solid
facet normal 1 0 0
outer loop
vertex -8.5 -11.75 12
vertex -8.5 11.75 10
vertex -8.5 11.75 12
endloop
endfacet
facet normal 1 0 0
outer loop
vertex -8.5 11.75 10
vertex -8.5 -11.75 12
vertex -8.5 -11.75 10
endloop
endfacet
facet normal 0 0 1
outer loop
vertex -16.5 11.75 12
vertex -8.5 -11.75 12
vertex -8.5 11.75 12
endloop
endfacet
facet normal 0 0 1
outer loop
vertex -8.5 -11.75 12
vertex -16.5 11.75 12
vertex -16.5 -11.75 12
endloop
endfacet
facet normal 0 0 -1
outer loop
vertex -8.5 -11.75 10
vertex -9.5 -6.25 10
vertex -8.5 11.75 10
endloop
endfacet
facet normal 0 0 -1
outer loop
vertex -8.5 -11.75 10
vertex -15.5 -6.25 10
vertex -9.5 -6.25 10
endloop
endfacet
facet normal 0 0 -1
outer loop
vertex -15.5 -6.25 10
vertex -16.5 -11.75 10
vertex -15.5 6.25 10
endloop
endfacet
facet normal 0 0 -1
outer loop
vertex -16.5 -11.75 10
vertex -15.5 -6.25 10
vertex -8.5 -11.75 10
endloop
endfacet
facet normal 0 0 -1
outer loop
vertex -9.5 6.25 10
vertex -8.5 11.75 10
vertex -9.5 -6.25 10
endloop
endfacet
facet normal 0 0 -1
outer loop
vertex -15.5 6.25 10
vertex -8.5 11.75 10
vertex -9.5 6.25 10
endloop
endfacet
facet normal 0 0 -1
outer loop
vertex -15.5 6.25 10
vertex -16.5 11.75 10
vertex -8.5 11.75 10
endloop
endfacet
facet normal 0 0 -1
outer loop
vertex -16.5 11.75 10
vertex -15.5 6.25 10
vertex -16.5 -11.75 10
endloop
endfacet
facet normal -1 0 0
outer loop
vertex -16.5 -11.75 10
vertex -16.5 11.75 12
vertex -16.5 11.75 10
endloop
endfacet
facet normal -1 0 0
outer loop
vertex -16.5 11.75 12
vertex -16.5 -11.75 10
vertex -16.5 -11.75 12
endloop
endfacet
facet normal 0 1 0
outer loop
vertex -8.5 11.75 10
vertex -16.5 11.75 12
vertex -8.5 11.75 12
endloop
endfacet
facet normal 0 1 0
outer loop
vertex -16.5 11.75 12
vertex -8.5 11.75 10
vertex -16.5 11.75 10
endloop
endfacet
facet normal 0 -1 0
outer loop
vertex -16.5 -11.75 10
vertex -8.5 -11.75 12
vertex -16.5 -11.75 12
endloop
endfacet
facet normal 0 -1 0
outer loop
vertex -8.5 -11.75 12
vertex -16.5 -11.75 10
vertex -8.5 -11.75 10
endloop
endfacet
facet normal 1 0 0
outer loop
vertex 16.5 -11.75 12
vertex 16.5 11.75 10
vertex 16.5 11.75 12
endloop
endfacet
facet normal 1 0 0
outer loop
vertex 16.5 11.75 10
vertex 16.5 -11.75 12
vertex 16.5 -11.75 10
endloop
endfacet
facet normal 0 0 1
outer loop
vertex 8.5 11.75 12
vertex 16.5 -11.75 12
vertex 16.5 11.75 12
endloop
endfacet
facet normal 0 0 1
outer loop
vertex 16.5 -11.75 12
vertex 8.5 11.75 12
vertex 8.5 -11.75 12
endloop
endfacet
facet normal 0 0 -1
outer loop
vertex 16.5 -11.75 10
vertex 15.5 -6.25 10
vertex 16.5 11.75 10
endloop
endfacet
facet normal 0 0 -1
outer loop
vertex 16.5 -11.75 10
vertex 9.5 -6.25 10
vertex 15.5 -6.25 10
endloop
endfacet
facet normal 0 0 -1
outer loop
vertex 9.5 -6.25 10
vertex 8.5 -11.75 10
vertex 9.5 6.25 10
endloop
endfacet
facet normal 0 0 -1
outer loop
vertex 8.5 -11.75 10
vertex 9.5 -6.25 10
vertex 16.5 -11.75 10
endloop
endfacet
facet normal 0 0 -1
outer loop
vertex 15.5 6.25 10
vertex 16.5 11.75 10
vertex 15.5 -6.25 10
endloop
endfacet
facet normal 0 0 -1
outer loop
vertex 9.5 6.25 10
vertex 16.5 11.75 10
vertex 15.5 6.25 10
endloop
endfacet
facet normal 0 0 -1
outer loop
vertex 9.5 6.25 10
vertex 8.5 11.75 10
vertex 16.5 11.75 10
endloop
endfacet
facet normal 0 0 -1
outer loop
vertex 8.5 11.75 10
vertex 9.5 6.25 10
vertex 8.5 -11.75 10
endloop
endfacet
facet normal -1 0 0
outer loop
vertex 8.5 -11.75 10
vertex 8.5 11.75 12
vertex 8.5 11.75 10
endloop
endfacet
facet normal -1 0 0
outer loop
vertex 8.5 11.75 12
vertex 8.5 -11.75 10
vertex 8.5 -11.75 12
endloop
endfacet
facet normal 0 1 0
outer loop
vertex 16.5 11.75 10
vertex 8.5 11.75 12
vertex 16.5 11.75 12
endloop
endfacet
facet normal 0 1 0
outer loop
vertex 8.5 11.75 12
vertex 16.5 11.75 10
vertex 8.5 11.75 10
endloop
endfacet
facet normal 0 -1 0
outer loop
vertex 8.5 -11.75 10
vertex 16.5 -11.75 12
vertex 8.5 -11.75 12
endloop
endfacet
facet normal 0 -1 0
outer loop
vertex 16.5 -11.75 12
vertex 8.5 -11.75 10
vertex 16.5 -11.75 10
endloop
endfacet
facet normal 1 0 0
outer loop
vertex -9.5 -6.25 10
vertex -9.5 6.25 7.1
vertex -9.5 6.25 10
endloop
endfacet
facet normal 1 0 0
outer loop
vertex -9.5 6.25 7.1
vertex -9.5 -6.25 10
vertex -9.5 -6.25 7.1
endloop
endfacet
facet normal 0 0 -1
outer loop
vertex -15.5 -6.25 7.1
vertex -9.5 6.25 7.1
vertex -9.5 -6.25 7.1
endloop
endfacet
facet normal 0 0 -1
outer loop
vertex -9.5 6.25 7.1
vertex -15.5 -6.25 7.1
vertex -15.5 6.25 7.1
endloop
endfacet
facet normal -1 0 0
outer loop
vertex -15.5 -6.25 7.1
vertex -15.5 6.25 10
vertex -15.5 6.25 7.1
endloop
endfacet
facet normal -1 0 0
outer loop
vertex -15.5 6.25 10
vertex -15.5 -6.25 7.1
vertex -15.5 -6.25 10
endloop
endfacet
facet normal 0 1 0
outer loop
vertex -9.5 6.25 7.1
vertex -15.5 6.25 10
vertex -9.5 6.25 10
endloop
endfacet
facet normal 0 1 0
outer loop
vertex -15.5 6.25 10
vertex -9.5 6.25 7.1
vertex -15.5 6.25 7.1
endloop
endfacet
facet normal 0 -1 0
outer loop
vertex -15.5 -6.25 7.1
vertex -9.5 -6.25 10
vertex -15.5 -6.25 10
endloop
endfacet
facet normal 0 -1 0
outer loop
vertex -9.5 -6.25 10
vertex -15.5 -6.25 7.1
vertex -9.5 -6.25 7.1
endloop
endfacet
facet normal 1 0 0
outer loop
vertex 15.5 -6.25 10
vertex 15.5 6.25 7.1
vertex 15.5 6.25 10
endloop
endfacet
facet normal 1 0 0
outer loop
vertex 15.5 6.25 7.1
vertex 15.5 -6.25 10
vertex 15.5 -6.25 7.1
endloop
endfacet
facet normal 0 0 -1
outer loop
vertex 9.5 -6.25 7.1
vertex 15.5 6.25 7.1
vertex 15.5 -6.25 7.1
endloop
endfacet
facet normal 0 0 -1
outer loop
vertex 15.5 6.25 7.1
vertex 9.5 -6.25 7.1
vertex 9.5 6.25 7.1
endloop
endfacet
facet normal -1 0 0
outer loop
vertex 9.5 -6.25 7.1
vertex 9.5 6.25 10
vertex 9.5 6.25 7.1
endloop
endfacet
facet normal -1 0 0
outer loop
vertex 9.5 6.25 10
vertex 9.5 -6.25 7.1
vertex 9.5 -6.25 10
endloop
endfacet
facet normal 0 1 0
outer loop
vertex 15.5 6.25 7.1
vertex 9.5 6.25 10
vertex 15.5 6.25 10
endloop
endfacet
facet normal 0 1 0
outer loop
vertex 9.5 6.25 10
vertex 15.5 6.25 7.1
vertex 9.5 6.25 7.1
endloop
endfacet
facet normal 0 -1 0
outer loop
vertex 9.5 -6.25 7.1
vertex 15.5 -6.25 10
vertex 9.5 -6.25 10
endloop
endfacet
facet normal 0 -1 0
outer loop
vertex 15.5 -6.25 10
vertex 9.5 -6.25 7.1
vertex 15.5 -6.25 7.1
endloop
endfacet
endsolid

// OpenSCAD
// file: ../../board-pocket/board-pocket.scad
//-----------------------------------------------------------------------
// Board pocket: holds a board that has no mounting holes
//
// The board sits on a central pedestal with a pad of double-sided foam tape
// on top, inside a low wall that follows its outline. The pedestal keeps
// the board's edges off the floor, so lead stubs soldered through the edge
// holes have room underneath; gaps in the wall let the leads out. The wall
// only locates the board: the tape holds it down, and in a closed box a lid
// pad presses a pad of foam onto it (boardLidPad below).
//
// Modules, all in the same frame:
//   boardPocketGhost()   the board and its tape, for previews
//   boardPocketHolder()  the plastic: pedestal and outline wall, add to the floor
//   boardLidPad()        a block hanging from the lid that presses foam onto the board
//   boardLidPadGhost()   the foam under it, squashed, for previews
//
// Frame: origin on the floor top, under the centre of the board's outline.
// X along the board's length l, Y across its width w, Z up. Units: mm.
//
// Sides are listed [-X, +X, -Y, +Y], each one of
//   "gap"    wall with a gap in the middle for leads (gapW wide)
//   "solid"  whole wall: use it where the board takes a push (a plug)
//   "open"   no wall: the board's edge goes into a box wall (a USB port)
//
// Used by esp32-c3-supermini, esp32-s3-devkitc and rs485-max485.
//-----------------------------------------------------------------------

//-- From the controller project's receiver.scad / rack-end.scad (boardPocket), 2026-10-30
bpPedestal  = 2.5;     // floor to the tape: room for lead stubs under the board edges
bpTape      = 1.0;     // double-sided foam tape on the pedestal. CAL: how far it squashes
bpWall      = 1.2;     // outline wall thickness
bpRise      = 1.0;     // wall top above the PCB underside (the controller project's rack-end: 0.8 under the S3's module)
bpClearance = 0.4;     // per side, board outline to wall: PETG. 0.3 for PLA. Set by the fit piece
bpGapW      = 6;       // lead gap in a "gap" side
bpPadInset  = 4;       // default pedestal: the board less this all round

//-- Lid hold-down (the controller project's receiver / rack-end lid pads)
bpFoam      = 3.0;     // CAL: self-adhesive foam stuck under each lid pad
bpSqueeze   = 1.0;     // how far the lid squashes it: ~1/3 for soft foam, 0.3 for felt

//-- PCB underside above the floor top
function boardPocketZ(pedestal = bpPedestal, tape = bpTape) = pedestal + tape;
//-- default pedestal [l, w] for a board
function boardPocketPad(l, w, inset = bpPadInset) = [max(l - 2*inset, 4), max(w - 2*inset, 4)];
//-- Z of a lid pad's underside, pressing on a surface at surfaceZ (board top, or a part on it)
function boardLidPadZ(surfaceZ, foam = bpFoam, squeeze = bpSqueeze) =
  assert(squeeze > 0 && squeeze < foam, "foam would not touch the board")
  surfaceZ + foam - squeeze;

function bpSides4(s) = is_list(s) ? s : [s, s, s, s];

module boardPocketGhost(l, w, pcb = 1.6, pad, pedestal = bpPedestal, tape = bpTape)
{
  p = is_undef(pad) ? boardPocketPad(l, w) : pad;
  %color("White") translate([-p[0]/2, -p[1]/2, pedestal]) cube([p[0], p[1], tape]);
  %color("DarkGreen") translate([-l/2, -w/2, pedestal + tape]) cube([l, w, pcb]);
}

//-- pad: pedestal [l, w]; gapW a number or one per side
module boardPocketHolder(l, w, pad, sides = "gap", gapW = bpGapW, clearance = bpClearance,
                         pedestal = bpPedestal, tape = bpTape, wall = bpWall, rise = bpRise)
{
  p   = is_undef(pad) ? boardPocketPad(l, w) : pad;
  s   = bpSides4(sides);
  g   = bpSides4(gapW);
  ix  = l/2 + clearance;                 // inner half sizes
  iy  = w/2 + clearance;
  top = pedestal + tape + rise;
  assert(p[0] <= l && p[1] <= w, "pedestal bigger than the board");
  for (k = s) assert(k == "gap" || k == "solid" || k == "open", str("unknown side ", k));

  //-- pedestal, centred under the board
  translate([-p[0]/2, -p[1]/2, -0.01]) cube([p[0], p[1], pedestal + 0.01]);
  //-- outline wall
  difference()
  {
    translate([-ix - wall, -iy - wall, -0.01]) cube([2*(ix + wall), 2*(iy + wall), top + 0.01]);
    translate([-ix, -iy, -1]) cube([2*ix, 2*iy, top + 2]);
    for (i = [0 : 3])
    {
      //-- each side's cut, drawn for -X then turned into place
      ax = (i < 2) ? ix : iy;         // inner half size across the side
      al = (i < 2) ? iy : ix;         // half length along it
      rotate([0, 0, [0, 180, 90, 270][i]])   // -X, +X, -Y, +Y
      {
        if (s[i] == "gap")
          translate([-ax - wall - 1, -g[i]/2, -1]) cube([wall + 2, g[i], top + 2]);
        if (s[i] == "open")
          translate([-ax - wall - 1, -al - wall - 1, -1]) cube([wall + 1.01, 2*(al + wall + 1), top + 2]);
      }
    }
  }
}

//-- A lid pad over the rectangle size [x, y] centred at `at`, from the squashed foam up to
//-- lidZ (the lid's inner face in this frame), running `into` up into the lid plate
module boardLidPad(size, at = [0, 0], surfaceZ, lidZ, foam = bpFoam, squeeze = bpSqueeze, into = 0.5)
{
  z0 = boardLidPadZ(surfaceZ, foam, squeeze);
  assert(lidZ > z0, "lid is below the pad: the box is too low for the foam");
  translate([at[0] - size[0]/2, at[1] - size[1]/2, z0]) cube([size[0], size[1], lidZ - z0 + into]);
}

module boardLidPadGhost(size, at = [0, 0], surfaceZ, foam = bpFoam, squeeze = bpSqueeze)
{
  %color("Gray") translate([at[0] - size[0]/2, at[1] - size[1]/2, surfaceZ]) cube([size[0], size[1], foam - squeeze]);
}
// file: ../rs485-max485.scad
//-----------------------------------------------------------------------
// TTL-to-RS485 module (MAX485 and friends), on the floor
//
// These modules have no mounting holes. The board sits on a taped pedestal
// inside an outline pocket (board-pocket), with lead gaps at both ends (bus
// end and logic end) and in the long sides. In a closed box two lid pads
// press foam onto it, one inboard of each end's pin row.
//
// Modules, all in the same frame:
//   rs485Ghost()     the board, its chips, pin holes and any screw terminal
//   rs485Holder()    the plastic: pedestal and outline pocket, add to the floor
//   rs485LidPads()   blocks under the lid that press foam onto the board
//
// Frame: origin on the floor top under the centre of the board. X along the
// board, bus end (A/B) at -X, logic end (VCC/TXD/RXD/GND) at +X. Z up. Units: mm.
//
// Sizes: pick a row of rs485Variants by name.
//-----------------------------------------------------------------------

//-- included, not used, so its default values (bpTape, bpClearance...) are in scope here
include <../board-pocket/board-pocket.scad>

//-- [name, length, width, pcb, tallest SMD, bus pins, logic pins, screw terminal [l, w, h] or undef]
rs485Variants = [
  //-- JZK 5-pack B09VGJCJKQ, auto-direction (MAX485 + CD4069). Outline measured 2026-10-21;
  //-- PCB CAL (probably 1.6). Bus end: A+ B- earth, bare holes. Logic: VCC TXD RXD GND
  ["jzk",    43.0, 15.5,  1.6, 2.0, 3, 4, undef],
  //-- XY-017 auto-direction (WINGONEER manual, manuals.plus/asin/B06XHH6B6R): 42.8 x 15.22 x 0.8.
  //-- Looks like the same family as the JZK; pin counts CAL
  ["xy-017", 42.8, 15.22, 0.8, 2.0, 3, 4, undef],
  //-- Classic blue MAX485 module (HW-0519 style): 44 x 14 on most listings (some 45 x 15, 46 x 12),
  //-- 4-pin header each end (RO RE DE DI / VCC B A GND), 2-way 5.08 screw terminal at the bus end.
  //-- PCB, terminal size and its place on the board CAL
  ["max485", 44.0, 14.0,  1.6, 2.0, 4, 4, [7.5, 10.2, 10.0]],
];
rs485Variant  = "jzk";

rs485PinPitch = 2.54;
rs485PinEnd   = 1.5;      // CAL: pin row centre from the board's end
rs485ChipSize = [5.0, 6.0, 1.75];   // SOIC-8, ghost only; placed either side of the middle (CAL)
//-- Holder (the controller project's receiver.scad / rack-end.scad)
rs485PadEnd   = 8.5;      // pedestal stops this far from each end: clear of the pin stubs
rs485PadSide  = 3.25;     // and this far from each long side (26 x 9 on the JZK)
rs485EndGap   = 10;       // lead gap at the ends: the 4-pin row is 7.62 across, plus wire
rs485SideGap  = 6;
rs485PadInset = 6;        // lid pads: this far inboard of each end
rs485PadLen   = 6;

function rs485(name = rs485Variant) = let (i = search([name], rs485Variants)[0])
  assert(i != [] && i != undef, str("unknown RS485 variant ", name)) rs485Variants[i];
function rs485Pad(variant = rs485Variant) = let (v = rs485(variant))
  [v[1] - 2*rs485PadEnd, v[2] - 2*rs485PadSide];
//-- PCB top above the floor
function rs485Top(variant = rs485Variant, pedestal = bpPedestal, tape = bpTape) =
  boardPocketZ(pedestal, tape) + rs485(variant)[3];

module rs485Ghost(variant = rs485Variant, pedestal = bpPedestal, tape = bpTape)
{
  v   = rs485(variant);
  top = rs485Top(variant, pedestal, tape);
  boardPocketGhost(v[1], v[2], v[3], rs485Pad(variant), pedestal, tape);
  for (x = [-1, 1])
    %color("Black") translate([x*5 - rs485ChipSize[0]/2, -rs485ChipSize[1]/2, top]) cube(rs485ChipSize);
  //-- pin rows across each end
  for (e = [[-1, v[5]], [1, v[6]]], i = [0 : e[1] - 1])
    %color("Gold") translate([e[0]*(v[1]/2 - rs485PinEnd), (i - (e[1] - 1)/2)*rs485PinPitch, top - v[3] - 0.01])
      cylinder(d = 1.0, h = v[3] + 0.02, $fn = 12);
  if (!is_undef(v[7]))
    %color("RoyalBlue") translate([-v[1]/2 + 3, -v[7][1]/2, top]) cube(v[7]);
}

module rs485Holder(variant = rs485Variant, sides = "gap", clearance = bpClearance,
                   pedestal = bpPedestal, tape = bpTape, rise = bpRise)
{
  v = rs485(variant);
  boardPocketHolder(v[1], v[2], rs485Pad(variant), sides,
                    [rs485EndGap, rs485EndGap, rs485SideGap, rs485SideGap],
                    clearance, pedestal, tape, bpWall, rise);
}

//-- lidZ: the lid's inner face above the floor top. With a screw terminal, the bus-end pad
//-- moves inboard of it
module rs485LidPads(lidZ, variant = rs485Variant, foam = bpFoam, squeeze = bpSqueeze,
                    pedestal = bpPedestal, tape = bpTape)
{
  v   = rs485(variant);
  top = rs485Top(variant, pedestal, tape);
  busIn = is_undef(v[7]) ? rs485PadInset : 3 + v[7][0] + 1;
  for (x = [-v[1]/2 + busIn + rs485PadLen/2, v[1]/2 - rs485PadInset - rs485PadLen/2])
    boardLidPad([rs485PadLen, v[2] - 3], [x, 0], top, lidZ, foam, squeeze);
}
// main file
// Two strips of lid with their pads, for the catalogue.
include <../rs485-max485.scad>

variant = "jzk";
lidZ    = 10;      // lid's inner face above the floor
v       = rs485(variant);
xs      = [-v[1]/2 + rs485PadInset + rs485PadLen/2, v[1]/2 - rs485PadInset - rs485PadLen/2];
for (x = xs) translate([x - rs485PadLen/2 - 1, -v[2]/2 - 4, lidZ]) cube([rs485PadLen + 2, v[2] + 8, 2]);
rs485LidPads(lidZ, variant);
